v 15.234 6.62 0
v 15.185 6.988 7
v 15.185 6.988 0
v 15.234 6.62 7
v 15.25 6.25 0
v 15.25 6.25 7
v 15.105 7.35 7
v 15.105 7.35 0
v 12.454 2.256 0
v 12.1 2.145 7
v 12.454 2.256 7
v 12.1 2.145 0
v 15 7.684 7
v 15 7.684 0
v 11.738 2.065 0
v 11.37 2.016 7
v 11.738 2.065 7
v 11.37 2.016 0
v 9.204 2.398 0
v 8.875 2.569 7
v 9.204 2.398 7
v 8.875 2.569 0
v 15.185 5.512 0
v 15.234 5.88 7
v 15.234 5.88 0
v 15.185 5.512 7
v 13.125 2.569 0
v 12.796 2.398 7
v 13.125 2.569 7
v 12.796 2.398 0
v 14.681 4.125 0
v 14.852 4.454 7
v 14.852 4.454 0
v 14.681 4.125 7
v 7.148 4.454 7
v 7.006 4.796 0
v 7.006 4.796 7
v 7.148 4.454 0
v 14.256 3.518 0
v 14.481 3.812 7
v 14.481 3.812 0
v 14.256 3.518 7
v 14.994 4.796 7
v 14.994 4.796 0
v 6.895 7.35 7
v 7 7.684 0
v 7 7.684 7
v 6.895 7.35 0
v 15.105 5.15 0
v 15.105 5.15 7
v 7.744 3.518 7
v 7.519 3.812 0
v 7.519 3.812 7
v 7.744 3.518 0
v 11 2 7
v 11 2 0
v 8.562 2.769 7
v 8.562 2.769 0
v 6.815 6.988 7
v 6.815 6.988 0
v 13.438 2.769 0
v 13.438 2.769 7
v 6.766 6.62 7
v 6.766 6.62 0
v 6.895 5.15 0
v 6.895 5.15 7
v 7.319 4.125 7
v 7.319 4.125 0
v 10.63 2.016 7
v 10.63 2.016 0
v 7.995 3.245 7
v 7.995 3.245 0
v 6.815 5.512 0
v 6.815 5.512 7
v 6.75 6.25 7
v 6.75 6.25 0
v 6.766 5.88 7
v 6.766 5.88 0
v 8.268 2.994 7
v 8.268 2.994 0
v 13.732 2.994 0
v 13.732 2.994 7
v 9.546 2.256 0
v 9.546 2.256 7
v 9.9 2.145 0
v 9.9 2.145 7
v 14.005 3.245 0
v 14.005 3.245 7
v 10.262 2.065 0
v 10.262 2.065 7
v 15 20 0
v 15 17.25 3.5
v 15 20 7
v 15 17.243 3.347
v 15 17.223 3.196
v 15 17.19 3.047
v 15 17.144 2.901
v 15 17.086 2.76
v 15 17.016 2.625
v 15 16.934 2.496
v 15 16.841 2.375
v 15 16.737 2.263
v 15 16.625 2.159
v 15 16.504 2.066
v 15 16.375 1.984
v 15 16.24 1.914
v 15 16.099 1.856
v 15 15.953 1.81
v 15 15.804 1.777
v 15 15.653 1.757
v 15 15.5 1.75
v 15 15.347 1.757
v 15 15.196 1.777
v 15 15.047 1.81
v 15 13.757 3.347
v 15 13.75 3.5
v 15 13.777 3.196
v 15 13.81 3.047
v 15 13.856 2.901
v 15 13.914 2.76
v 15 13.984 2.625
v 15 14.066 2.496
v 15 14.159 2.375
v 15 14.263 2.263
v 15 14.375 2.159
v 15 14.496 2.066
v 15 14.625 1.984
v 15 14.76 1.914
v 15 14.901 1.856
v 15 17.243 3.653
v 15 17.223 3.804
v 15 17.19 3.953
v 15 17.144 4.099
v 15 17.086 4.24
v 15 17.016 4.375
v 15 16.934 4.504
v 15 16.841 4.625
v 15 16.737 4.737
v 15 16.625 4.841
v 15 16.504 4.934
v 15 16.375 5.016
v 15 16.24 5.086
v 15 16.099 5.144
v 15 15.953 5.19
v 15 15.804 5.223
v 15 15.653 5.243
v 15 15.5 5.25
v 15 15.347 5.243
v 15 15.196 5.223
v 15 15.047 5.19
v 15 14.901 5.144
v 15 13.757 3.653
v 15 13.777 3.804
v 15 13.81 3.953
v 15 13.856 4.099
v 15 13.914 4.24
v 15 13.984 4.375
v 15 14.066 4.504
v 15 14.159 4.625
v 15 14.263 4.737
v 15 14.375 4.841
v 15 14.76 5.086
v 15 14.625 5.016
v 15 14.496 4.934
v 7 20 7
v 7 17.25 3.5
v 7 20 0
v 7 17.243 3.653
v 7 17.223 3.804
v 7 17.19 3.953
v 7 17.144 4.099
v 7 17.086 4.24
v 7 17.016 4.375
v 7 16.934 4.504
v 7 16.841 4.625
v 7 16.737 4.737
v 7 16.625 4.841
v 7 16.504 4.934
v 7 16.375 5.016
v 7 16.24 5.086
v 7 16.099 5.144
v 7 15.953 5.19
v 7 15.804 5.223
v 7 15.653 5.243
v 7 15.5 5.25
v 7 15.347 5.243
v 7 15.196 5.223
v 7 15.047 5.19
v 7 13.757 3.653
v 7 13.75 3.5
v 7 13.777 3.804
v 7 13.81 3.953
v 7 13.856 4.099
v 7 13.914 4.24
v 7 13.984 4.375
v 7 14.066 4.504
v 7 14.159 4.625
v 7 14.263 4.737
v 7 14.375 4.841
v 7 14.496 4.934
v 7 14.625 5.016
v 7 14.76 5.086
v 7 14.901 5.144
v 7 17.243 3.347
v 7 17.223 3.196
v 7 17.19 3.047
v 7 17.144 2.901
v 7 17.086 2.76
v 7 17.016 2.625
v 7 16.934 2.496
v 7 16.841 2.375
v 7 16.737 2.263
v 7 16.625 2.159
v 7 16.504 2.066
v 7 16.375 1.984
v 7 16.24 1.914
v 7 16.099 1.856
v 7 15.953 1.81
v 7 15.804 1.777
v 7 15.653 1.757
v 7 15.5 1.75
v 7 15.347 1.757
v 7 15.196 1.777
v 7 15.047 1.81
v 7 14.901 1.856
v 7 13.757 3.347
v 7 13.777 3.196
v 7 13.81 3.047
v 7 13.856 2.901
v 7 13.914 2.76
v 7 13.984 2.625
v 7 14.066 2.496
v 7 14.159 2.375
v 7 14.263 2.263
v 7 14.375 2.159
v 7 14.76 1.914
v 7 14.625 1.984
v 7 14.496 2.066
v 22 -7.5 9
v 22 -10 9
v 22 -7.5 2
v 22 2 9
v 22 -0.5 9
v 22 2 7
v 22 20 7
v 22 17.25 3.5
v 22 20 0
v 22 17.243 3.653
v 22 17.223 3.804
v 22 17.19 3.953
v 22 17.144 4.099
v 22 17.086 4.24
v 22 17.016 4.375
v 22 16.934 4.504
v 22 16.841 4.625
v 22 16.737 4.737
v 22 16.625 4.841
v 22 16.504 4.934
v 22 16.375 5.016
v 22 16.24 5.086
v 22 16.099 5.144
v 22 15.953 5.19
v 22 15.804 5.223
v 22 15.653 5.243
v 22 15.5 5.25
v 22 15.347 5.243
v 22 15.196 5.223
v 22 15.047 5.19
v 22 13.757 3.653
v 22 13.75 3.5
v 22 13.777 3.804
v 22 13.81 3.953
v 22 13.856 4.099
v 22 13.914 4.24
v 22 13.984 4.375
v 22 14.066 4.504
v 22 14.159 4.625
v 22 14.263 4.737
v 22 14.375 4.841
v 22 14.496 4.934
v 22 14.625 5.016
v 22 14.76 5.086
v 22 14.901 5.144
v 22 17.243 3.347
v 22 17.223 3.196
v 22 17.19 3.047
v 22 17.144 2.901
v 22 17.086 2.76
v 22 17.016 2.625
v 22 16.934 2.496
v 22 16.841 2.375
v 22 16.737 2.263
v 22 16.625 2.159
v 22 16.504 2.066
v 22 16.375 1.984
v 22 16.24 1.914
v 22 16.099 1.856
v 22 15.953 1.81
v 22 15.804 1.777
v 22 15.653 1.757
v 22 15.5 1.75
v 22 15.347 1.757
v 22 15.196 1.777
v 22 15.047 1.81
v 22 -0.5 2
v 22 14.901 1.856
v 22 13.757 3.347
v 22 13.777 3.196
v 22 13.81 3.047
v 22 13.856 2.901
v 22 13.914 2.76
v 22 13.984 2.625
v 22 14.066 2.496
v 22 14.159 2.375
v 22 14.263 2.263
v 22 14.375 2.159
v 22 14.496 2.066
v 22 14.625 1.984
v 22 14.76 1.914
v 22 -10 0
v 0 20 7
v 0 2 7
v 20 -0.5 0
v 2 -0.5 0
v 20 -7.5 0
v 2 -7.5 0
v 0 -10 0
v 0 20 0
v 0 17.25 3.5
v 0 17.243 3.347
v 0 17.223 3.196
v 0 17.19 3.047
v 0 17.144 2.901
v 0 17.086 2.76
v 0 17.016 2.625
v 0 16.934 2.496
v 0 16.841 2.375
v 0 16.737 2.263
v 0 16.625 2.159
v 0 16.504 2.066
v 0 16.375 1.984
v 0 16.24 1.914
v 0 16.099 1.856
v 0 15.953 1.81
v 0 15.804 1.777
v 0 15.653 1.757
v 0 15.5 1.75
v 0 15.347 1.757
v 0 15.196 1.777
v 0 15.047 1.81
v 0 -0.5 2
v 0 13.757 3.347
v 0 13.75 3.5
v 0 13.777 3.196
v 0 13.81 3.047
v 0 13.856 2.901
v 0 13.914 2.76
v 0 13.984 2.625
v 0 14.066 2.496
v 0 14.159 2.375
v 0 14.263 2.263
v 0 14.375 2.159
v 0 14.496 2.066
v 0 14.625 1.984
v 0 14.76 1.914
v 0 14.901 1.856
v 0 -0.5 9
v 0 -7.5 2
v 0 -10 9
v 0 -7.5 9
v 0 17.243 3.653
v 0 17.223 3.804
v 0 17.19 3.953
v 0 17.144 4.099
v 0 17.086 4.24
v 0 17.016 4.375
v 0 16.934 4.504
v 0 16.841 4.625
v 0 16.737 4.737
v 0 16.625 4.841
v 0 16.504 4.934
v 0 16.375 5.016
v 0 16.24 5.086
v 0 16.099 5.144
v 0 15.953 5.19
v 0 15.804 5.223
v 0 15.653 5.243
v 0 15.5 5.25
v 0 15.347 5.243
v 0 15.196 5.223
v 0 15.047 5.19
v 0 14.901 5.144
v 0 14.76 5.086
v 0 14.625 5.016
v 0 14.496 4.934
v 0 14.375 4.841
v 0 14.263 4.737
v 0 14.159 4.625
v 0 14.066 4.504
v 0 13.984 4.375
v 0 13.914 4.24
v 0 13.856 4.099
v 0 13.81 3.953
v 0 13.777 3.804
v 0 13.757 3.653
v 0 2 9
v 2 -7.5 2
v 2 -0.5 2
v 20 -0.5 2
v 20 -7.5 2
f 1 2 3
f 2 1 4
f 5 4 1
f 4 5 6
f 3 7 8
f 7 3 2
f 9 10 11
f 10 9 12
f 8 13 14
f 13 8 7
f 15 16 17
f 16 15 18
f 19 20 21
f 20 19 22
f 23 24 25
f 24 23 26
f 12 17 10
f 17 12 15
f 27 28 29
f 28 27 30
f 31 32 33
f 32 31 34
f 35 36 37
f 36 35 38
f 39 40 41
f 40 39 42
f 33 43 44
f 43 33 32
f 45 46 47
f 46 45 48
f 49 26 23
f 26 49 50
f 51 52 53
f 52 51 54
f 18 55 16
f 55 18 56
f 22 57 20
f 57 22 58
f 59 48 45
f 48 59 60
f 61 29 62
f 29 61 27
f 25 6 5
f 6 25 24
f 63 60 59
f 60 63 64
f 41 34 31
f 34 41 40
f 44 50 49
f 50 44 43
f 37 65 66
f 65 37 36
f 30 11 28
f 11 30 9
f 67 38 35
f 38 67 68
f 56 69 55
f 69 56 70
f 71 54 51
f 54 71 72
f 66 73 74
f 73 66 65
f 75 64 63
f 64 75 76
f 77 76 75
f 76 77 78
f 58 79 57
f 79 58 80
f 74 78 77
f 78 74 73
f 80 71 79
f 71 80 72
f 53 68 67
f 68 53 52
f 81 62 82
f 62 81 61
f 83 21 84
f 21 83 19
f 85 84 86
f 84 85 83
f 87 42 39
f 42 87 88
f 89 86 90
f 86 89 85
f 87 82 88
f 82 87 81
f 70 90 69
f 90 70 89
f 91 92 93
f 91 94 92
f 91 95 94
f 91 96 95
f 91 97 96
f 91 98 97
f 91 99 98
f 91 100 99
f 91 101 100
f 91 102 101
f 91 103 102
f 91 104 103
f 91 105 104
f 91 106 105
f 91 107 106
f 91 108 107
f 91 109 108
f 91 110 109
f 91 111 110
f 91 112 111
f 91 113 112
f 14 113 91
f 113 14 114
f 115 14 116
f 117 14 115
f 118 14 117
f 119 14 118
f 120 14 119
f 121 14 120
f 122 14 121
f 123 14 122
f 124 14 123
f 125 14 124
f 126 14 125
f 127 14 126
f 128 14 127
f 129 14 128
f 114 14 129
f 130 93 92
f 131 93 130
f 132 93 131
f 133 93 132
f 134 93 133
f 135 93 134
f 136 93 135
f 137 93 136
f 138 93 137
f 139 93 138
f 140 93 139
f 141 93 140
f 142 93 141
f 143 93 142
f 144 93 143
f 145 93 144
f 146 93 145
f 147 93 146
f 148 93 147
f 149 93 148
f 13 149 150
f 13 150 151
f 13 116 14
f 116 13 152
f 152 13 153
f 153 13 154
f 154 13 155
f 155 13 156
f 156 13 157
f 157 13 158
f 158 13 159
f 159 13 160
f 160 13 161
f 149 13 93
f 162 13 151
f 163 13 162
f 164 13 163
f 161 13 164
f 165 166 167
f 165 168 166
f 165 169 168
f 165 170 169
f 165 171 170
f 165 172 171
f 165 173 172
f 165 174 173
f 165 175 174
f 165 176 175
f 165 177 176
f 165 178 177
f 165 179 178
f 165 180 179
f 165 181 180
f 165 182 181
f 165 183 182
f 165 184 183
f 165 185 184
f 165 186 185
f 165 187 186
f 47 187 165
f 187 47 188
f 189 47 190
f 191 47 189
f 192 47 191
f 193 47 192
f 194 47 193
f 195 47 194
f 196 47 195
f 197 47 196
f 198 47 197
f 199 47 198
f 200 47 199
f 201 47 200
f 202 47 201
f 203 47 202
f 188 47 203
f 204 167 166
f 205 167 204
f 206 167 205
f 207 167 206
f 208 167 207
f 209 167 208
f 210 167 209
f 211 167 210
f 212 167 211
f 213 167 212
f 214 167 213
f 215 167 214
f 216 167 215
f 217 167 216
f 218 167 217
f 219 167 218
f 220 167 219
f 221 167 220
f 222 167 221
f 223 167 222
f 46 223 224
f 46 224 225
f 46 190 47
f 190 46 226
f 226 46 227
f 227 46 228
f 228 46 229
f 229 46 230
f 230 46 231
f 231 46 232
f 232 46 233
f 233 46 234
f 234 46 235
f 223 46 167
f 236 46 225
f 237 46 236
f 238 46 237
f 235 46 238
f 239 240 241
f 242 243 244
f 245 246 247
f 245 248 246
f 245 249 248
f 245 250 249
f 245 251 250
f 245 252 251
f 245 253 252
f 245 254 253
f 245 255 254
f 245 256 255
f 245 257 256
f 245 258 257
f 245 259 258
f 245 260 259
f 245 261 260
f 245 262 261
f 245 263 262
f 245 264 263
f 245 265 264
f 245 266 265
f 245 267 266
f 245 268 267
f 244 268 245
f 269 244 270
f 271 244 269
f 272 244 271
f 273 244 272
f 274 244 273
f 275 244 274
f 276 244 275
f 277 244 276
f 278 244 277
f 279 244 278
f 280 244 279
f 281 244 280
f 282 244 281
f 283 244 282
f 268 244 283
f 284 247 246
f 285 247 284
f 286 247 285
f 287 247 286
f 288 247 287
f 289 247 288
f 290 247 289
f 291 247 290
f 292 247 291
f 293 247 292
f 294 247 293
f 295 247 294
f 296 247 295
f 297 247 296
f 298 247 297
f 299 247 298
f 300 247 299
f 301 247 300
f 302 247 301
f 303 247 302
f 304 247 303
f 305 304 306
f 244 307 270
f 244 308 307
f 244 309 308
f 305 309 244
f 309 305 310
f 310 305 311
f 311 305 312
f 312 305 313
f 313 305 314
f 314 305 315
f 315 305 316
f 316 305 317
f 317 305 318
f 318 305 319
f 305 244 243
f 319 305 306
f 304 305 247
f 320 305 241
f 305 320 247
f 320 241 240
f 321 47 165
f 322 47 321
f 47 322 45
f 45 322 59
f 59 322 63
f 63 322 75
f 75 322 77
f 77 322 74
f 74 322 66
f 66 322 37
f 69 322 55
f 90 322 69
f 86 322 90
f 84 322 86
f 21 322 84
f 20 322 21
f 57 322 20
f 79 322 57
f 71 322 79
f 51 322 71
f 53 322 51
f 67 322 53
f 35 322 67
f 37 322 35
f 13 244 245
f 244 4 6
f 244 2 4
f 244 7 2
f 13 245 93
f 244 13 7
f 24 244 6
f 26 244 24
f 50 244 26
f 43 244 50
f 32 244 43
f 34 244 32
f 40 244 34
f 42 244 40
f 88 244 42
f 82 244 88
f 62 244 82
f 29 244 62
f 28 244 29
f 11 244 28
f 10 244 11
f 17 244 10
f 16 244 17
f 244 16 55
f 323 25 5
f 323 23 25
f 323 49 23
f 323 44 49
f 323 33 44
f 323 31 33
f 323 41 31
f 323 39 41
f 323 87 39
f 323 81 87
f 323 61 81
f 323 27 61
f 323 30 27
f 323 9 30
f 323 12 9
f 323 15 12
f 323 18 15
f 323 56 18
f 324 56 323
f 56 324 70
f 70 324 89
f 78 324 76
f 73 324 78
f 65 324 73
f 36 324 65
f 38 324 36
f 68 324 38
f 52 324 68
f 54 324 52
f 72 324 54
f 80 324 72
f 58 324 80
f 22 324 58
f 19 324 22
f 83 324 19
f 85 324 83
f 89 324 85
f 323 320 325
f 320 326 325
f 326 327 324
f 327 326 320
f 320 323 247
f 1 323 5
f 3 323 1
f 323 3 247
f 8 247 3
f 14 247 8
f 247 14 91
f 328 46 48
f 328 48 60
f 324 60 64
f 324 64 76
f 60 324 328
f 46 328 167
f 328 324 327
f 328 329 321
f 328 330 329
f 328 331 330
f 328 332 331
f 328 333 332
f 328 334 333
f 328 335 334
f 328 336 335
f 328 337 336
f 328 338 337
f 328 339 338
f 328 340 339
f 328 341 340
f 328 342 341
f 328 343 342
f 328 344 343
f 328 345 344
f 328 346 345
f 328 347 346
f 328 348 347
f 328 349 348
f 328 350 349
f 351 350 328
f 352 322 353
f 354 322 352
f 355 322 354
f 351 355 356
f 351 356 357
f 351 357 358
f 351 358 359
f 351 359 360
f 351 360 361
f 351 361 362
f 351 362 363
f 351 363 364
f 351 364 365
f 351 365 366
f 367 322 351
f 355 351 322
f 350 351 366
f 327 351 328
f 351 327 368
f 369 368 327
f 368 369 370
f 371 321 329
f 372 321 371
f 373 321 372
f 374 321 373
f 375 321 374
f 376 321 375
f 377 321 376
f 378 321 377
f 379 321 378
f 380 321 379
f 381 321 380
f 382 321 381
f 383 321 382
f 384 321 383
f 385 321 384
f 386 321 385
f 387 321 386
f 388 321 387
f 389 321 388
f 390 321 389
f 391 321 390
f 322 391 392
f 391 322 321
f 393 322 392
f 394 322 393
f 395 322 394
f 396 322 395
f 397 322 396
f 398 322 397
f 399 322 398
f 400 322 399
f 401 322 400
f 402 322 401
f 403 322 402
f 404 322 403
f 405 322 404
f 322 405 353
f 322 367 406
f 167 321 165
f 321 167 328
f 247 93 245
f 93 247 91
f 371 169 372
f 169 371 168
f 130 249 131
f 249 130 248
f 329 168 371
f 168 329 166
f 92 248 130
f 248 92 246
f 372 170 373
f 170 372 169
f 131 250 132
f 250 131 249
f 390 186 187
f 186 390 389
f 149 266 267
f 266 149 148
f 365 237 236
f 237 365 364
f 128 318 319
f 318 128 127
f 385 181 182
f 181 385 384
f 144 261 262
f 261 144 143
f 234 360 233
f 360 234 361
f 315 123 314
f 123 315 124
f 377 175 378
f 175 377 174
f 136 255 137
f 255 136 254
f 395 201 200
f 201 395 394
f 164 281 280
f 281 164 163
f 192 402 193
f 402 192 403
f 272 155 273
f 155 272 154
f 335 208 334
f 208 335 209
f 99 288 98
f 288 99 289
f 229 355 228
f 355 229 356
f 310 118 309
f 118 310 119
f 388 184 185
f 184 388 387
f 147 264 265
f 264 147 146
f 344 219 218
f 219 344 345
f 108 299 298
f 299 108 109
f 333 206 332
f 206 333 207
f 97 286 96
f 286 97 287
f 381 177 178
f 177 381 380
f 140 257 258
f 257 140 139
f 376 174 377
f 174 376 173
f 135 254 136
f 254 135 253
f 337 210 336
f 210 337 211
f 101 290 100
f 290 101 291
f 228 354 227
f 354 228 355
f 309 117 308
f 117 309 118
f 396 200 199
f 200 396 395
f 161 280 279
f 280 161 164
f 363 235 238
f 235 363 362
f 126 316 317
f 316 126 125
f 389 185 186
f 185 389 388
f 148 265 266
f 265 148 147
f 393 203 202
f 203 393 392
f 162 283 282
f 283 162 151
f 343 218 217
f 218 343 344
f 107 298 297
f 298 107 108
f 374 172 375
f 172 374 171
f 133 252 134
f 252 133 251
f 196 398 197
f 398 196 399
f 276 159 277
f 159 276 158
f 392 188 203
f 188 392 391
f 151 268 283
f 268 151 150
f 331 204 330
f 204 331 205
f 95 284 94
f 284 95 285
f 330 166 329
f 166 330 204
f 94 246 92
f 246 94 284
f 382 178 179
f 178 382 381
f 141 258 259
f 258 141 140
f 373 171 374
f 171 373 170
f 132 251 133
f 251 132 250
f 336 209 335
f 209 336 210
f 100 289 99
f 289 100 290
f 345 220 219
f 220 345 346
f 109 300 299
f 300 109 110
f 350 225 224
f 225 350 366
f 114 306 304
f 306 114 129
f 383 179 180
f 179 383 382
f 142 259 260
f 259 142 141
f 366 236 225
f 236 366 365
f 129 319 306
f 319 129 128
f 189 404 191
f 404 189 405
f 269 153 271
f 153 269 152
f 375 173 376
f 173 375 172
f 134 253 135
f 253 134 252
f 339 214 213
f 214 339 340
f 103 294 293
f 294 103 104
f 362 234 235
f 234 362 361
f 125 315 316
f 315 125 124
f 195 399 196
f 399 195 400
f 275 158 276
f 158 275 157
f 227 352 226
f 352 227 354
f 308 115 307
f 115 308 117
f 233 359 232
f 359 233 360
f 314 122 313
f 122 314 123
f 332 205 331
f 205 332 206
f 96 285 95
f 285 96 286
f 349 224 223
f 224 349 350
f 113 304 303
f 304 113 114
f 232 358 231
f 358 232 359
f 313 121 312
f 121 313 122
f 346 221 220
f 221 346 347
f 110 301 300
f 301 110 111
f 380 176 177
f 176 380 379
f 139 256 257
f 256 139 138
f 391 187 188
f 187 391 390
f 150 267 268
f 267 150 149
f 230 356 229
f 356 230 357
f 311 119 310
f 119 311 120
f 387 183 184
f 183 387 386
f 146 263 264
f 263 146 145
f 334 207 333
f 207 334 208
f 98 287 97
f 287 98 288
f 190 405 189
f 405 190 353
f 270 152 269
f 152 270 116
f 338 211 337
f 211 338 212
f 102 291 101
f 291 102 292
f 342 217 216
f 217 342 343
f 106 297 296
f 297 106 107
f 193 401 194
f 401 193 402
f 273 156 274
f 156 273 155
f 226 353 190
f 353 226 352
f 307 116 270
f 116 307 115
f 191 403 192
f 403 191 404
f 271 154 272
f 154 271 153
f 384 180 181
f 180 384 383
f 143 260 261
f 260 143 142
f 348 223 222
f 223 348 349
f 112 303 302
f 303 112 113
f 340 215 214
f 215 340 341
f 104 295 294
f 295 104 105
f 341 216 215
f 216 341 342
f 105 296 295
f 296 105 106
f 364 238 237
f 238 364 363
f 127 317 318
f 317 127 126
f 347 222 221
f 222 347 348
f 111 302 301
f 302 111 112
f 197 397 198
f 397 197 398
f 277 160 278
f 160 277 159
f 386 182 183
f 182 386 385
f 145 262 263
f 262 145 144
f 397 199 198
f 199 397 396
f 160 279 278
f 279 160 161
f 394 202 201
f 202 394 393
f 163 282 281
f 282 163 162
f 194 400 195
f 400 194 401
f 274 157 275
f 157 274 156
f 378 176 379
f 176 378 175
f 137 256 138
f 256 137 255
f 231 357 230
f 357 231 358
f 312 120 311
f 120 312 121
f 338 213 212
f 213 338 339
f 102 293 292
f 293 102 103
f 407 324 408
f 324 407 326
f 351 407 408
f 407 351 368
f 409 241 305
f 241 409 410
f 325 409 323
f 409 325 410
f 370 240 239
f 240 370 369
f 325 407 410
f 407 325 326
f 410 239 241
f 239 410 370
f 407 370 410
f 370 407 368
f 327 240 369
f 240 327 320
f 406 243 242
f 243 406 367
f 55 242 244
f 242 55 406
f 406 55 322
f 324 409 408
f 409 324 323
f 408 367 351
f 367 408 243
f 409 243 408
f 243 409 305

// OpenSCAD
$fa=5; $fs=0.1;

difference(){
    cube([22, 20, 7]);
    
    {
    translate([11, 6.25, 3.5])
       {cylinder(r=4.25, h=7.01, center=true);
        translate([0, 7.125, 0])
           cube([8, 13.26, 7.01], center=true);
       }
    
    translate([11, 15.5, 3.5])
       rotate([90, 0, 90])
        cylinder(h=22.01, r=1.75, center=true);
    }
}

translate([0, -8, 0])
    cube([2, 8, 2]);

translate([20, -8, 0])
    cube([2, 8, 2]);

translate([0, -10, 0])
    cube([22, 2.5, 9]);

translate([0, -0.5, 0])
    cube([22, 2.5, 9]);
